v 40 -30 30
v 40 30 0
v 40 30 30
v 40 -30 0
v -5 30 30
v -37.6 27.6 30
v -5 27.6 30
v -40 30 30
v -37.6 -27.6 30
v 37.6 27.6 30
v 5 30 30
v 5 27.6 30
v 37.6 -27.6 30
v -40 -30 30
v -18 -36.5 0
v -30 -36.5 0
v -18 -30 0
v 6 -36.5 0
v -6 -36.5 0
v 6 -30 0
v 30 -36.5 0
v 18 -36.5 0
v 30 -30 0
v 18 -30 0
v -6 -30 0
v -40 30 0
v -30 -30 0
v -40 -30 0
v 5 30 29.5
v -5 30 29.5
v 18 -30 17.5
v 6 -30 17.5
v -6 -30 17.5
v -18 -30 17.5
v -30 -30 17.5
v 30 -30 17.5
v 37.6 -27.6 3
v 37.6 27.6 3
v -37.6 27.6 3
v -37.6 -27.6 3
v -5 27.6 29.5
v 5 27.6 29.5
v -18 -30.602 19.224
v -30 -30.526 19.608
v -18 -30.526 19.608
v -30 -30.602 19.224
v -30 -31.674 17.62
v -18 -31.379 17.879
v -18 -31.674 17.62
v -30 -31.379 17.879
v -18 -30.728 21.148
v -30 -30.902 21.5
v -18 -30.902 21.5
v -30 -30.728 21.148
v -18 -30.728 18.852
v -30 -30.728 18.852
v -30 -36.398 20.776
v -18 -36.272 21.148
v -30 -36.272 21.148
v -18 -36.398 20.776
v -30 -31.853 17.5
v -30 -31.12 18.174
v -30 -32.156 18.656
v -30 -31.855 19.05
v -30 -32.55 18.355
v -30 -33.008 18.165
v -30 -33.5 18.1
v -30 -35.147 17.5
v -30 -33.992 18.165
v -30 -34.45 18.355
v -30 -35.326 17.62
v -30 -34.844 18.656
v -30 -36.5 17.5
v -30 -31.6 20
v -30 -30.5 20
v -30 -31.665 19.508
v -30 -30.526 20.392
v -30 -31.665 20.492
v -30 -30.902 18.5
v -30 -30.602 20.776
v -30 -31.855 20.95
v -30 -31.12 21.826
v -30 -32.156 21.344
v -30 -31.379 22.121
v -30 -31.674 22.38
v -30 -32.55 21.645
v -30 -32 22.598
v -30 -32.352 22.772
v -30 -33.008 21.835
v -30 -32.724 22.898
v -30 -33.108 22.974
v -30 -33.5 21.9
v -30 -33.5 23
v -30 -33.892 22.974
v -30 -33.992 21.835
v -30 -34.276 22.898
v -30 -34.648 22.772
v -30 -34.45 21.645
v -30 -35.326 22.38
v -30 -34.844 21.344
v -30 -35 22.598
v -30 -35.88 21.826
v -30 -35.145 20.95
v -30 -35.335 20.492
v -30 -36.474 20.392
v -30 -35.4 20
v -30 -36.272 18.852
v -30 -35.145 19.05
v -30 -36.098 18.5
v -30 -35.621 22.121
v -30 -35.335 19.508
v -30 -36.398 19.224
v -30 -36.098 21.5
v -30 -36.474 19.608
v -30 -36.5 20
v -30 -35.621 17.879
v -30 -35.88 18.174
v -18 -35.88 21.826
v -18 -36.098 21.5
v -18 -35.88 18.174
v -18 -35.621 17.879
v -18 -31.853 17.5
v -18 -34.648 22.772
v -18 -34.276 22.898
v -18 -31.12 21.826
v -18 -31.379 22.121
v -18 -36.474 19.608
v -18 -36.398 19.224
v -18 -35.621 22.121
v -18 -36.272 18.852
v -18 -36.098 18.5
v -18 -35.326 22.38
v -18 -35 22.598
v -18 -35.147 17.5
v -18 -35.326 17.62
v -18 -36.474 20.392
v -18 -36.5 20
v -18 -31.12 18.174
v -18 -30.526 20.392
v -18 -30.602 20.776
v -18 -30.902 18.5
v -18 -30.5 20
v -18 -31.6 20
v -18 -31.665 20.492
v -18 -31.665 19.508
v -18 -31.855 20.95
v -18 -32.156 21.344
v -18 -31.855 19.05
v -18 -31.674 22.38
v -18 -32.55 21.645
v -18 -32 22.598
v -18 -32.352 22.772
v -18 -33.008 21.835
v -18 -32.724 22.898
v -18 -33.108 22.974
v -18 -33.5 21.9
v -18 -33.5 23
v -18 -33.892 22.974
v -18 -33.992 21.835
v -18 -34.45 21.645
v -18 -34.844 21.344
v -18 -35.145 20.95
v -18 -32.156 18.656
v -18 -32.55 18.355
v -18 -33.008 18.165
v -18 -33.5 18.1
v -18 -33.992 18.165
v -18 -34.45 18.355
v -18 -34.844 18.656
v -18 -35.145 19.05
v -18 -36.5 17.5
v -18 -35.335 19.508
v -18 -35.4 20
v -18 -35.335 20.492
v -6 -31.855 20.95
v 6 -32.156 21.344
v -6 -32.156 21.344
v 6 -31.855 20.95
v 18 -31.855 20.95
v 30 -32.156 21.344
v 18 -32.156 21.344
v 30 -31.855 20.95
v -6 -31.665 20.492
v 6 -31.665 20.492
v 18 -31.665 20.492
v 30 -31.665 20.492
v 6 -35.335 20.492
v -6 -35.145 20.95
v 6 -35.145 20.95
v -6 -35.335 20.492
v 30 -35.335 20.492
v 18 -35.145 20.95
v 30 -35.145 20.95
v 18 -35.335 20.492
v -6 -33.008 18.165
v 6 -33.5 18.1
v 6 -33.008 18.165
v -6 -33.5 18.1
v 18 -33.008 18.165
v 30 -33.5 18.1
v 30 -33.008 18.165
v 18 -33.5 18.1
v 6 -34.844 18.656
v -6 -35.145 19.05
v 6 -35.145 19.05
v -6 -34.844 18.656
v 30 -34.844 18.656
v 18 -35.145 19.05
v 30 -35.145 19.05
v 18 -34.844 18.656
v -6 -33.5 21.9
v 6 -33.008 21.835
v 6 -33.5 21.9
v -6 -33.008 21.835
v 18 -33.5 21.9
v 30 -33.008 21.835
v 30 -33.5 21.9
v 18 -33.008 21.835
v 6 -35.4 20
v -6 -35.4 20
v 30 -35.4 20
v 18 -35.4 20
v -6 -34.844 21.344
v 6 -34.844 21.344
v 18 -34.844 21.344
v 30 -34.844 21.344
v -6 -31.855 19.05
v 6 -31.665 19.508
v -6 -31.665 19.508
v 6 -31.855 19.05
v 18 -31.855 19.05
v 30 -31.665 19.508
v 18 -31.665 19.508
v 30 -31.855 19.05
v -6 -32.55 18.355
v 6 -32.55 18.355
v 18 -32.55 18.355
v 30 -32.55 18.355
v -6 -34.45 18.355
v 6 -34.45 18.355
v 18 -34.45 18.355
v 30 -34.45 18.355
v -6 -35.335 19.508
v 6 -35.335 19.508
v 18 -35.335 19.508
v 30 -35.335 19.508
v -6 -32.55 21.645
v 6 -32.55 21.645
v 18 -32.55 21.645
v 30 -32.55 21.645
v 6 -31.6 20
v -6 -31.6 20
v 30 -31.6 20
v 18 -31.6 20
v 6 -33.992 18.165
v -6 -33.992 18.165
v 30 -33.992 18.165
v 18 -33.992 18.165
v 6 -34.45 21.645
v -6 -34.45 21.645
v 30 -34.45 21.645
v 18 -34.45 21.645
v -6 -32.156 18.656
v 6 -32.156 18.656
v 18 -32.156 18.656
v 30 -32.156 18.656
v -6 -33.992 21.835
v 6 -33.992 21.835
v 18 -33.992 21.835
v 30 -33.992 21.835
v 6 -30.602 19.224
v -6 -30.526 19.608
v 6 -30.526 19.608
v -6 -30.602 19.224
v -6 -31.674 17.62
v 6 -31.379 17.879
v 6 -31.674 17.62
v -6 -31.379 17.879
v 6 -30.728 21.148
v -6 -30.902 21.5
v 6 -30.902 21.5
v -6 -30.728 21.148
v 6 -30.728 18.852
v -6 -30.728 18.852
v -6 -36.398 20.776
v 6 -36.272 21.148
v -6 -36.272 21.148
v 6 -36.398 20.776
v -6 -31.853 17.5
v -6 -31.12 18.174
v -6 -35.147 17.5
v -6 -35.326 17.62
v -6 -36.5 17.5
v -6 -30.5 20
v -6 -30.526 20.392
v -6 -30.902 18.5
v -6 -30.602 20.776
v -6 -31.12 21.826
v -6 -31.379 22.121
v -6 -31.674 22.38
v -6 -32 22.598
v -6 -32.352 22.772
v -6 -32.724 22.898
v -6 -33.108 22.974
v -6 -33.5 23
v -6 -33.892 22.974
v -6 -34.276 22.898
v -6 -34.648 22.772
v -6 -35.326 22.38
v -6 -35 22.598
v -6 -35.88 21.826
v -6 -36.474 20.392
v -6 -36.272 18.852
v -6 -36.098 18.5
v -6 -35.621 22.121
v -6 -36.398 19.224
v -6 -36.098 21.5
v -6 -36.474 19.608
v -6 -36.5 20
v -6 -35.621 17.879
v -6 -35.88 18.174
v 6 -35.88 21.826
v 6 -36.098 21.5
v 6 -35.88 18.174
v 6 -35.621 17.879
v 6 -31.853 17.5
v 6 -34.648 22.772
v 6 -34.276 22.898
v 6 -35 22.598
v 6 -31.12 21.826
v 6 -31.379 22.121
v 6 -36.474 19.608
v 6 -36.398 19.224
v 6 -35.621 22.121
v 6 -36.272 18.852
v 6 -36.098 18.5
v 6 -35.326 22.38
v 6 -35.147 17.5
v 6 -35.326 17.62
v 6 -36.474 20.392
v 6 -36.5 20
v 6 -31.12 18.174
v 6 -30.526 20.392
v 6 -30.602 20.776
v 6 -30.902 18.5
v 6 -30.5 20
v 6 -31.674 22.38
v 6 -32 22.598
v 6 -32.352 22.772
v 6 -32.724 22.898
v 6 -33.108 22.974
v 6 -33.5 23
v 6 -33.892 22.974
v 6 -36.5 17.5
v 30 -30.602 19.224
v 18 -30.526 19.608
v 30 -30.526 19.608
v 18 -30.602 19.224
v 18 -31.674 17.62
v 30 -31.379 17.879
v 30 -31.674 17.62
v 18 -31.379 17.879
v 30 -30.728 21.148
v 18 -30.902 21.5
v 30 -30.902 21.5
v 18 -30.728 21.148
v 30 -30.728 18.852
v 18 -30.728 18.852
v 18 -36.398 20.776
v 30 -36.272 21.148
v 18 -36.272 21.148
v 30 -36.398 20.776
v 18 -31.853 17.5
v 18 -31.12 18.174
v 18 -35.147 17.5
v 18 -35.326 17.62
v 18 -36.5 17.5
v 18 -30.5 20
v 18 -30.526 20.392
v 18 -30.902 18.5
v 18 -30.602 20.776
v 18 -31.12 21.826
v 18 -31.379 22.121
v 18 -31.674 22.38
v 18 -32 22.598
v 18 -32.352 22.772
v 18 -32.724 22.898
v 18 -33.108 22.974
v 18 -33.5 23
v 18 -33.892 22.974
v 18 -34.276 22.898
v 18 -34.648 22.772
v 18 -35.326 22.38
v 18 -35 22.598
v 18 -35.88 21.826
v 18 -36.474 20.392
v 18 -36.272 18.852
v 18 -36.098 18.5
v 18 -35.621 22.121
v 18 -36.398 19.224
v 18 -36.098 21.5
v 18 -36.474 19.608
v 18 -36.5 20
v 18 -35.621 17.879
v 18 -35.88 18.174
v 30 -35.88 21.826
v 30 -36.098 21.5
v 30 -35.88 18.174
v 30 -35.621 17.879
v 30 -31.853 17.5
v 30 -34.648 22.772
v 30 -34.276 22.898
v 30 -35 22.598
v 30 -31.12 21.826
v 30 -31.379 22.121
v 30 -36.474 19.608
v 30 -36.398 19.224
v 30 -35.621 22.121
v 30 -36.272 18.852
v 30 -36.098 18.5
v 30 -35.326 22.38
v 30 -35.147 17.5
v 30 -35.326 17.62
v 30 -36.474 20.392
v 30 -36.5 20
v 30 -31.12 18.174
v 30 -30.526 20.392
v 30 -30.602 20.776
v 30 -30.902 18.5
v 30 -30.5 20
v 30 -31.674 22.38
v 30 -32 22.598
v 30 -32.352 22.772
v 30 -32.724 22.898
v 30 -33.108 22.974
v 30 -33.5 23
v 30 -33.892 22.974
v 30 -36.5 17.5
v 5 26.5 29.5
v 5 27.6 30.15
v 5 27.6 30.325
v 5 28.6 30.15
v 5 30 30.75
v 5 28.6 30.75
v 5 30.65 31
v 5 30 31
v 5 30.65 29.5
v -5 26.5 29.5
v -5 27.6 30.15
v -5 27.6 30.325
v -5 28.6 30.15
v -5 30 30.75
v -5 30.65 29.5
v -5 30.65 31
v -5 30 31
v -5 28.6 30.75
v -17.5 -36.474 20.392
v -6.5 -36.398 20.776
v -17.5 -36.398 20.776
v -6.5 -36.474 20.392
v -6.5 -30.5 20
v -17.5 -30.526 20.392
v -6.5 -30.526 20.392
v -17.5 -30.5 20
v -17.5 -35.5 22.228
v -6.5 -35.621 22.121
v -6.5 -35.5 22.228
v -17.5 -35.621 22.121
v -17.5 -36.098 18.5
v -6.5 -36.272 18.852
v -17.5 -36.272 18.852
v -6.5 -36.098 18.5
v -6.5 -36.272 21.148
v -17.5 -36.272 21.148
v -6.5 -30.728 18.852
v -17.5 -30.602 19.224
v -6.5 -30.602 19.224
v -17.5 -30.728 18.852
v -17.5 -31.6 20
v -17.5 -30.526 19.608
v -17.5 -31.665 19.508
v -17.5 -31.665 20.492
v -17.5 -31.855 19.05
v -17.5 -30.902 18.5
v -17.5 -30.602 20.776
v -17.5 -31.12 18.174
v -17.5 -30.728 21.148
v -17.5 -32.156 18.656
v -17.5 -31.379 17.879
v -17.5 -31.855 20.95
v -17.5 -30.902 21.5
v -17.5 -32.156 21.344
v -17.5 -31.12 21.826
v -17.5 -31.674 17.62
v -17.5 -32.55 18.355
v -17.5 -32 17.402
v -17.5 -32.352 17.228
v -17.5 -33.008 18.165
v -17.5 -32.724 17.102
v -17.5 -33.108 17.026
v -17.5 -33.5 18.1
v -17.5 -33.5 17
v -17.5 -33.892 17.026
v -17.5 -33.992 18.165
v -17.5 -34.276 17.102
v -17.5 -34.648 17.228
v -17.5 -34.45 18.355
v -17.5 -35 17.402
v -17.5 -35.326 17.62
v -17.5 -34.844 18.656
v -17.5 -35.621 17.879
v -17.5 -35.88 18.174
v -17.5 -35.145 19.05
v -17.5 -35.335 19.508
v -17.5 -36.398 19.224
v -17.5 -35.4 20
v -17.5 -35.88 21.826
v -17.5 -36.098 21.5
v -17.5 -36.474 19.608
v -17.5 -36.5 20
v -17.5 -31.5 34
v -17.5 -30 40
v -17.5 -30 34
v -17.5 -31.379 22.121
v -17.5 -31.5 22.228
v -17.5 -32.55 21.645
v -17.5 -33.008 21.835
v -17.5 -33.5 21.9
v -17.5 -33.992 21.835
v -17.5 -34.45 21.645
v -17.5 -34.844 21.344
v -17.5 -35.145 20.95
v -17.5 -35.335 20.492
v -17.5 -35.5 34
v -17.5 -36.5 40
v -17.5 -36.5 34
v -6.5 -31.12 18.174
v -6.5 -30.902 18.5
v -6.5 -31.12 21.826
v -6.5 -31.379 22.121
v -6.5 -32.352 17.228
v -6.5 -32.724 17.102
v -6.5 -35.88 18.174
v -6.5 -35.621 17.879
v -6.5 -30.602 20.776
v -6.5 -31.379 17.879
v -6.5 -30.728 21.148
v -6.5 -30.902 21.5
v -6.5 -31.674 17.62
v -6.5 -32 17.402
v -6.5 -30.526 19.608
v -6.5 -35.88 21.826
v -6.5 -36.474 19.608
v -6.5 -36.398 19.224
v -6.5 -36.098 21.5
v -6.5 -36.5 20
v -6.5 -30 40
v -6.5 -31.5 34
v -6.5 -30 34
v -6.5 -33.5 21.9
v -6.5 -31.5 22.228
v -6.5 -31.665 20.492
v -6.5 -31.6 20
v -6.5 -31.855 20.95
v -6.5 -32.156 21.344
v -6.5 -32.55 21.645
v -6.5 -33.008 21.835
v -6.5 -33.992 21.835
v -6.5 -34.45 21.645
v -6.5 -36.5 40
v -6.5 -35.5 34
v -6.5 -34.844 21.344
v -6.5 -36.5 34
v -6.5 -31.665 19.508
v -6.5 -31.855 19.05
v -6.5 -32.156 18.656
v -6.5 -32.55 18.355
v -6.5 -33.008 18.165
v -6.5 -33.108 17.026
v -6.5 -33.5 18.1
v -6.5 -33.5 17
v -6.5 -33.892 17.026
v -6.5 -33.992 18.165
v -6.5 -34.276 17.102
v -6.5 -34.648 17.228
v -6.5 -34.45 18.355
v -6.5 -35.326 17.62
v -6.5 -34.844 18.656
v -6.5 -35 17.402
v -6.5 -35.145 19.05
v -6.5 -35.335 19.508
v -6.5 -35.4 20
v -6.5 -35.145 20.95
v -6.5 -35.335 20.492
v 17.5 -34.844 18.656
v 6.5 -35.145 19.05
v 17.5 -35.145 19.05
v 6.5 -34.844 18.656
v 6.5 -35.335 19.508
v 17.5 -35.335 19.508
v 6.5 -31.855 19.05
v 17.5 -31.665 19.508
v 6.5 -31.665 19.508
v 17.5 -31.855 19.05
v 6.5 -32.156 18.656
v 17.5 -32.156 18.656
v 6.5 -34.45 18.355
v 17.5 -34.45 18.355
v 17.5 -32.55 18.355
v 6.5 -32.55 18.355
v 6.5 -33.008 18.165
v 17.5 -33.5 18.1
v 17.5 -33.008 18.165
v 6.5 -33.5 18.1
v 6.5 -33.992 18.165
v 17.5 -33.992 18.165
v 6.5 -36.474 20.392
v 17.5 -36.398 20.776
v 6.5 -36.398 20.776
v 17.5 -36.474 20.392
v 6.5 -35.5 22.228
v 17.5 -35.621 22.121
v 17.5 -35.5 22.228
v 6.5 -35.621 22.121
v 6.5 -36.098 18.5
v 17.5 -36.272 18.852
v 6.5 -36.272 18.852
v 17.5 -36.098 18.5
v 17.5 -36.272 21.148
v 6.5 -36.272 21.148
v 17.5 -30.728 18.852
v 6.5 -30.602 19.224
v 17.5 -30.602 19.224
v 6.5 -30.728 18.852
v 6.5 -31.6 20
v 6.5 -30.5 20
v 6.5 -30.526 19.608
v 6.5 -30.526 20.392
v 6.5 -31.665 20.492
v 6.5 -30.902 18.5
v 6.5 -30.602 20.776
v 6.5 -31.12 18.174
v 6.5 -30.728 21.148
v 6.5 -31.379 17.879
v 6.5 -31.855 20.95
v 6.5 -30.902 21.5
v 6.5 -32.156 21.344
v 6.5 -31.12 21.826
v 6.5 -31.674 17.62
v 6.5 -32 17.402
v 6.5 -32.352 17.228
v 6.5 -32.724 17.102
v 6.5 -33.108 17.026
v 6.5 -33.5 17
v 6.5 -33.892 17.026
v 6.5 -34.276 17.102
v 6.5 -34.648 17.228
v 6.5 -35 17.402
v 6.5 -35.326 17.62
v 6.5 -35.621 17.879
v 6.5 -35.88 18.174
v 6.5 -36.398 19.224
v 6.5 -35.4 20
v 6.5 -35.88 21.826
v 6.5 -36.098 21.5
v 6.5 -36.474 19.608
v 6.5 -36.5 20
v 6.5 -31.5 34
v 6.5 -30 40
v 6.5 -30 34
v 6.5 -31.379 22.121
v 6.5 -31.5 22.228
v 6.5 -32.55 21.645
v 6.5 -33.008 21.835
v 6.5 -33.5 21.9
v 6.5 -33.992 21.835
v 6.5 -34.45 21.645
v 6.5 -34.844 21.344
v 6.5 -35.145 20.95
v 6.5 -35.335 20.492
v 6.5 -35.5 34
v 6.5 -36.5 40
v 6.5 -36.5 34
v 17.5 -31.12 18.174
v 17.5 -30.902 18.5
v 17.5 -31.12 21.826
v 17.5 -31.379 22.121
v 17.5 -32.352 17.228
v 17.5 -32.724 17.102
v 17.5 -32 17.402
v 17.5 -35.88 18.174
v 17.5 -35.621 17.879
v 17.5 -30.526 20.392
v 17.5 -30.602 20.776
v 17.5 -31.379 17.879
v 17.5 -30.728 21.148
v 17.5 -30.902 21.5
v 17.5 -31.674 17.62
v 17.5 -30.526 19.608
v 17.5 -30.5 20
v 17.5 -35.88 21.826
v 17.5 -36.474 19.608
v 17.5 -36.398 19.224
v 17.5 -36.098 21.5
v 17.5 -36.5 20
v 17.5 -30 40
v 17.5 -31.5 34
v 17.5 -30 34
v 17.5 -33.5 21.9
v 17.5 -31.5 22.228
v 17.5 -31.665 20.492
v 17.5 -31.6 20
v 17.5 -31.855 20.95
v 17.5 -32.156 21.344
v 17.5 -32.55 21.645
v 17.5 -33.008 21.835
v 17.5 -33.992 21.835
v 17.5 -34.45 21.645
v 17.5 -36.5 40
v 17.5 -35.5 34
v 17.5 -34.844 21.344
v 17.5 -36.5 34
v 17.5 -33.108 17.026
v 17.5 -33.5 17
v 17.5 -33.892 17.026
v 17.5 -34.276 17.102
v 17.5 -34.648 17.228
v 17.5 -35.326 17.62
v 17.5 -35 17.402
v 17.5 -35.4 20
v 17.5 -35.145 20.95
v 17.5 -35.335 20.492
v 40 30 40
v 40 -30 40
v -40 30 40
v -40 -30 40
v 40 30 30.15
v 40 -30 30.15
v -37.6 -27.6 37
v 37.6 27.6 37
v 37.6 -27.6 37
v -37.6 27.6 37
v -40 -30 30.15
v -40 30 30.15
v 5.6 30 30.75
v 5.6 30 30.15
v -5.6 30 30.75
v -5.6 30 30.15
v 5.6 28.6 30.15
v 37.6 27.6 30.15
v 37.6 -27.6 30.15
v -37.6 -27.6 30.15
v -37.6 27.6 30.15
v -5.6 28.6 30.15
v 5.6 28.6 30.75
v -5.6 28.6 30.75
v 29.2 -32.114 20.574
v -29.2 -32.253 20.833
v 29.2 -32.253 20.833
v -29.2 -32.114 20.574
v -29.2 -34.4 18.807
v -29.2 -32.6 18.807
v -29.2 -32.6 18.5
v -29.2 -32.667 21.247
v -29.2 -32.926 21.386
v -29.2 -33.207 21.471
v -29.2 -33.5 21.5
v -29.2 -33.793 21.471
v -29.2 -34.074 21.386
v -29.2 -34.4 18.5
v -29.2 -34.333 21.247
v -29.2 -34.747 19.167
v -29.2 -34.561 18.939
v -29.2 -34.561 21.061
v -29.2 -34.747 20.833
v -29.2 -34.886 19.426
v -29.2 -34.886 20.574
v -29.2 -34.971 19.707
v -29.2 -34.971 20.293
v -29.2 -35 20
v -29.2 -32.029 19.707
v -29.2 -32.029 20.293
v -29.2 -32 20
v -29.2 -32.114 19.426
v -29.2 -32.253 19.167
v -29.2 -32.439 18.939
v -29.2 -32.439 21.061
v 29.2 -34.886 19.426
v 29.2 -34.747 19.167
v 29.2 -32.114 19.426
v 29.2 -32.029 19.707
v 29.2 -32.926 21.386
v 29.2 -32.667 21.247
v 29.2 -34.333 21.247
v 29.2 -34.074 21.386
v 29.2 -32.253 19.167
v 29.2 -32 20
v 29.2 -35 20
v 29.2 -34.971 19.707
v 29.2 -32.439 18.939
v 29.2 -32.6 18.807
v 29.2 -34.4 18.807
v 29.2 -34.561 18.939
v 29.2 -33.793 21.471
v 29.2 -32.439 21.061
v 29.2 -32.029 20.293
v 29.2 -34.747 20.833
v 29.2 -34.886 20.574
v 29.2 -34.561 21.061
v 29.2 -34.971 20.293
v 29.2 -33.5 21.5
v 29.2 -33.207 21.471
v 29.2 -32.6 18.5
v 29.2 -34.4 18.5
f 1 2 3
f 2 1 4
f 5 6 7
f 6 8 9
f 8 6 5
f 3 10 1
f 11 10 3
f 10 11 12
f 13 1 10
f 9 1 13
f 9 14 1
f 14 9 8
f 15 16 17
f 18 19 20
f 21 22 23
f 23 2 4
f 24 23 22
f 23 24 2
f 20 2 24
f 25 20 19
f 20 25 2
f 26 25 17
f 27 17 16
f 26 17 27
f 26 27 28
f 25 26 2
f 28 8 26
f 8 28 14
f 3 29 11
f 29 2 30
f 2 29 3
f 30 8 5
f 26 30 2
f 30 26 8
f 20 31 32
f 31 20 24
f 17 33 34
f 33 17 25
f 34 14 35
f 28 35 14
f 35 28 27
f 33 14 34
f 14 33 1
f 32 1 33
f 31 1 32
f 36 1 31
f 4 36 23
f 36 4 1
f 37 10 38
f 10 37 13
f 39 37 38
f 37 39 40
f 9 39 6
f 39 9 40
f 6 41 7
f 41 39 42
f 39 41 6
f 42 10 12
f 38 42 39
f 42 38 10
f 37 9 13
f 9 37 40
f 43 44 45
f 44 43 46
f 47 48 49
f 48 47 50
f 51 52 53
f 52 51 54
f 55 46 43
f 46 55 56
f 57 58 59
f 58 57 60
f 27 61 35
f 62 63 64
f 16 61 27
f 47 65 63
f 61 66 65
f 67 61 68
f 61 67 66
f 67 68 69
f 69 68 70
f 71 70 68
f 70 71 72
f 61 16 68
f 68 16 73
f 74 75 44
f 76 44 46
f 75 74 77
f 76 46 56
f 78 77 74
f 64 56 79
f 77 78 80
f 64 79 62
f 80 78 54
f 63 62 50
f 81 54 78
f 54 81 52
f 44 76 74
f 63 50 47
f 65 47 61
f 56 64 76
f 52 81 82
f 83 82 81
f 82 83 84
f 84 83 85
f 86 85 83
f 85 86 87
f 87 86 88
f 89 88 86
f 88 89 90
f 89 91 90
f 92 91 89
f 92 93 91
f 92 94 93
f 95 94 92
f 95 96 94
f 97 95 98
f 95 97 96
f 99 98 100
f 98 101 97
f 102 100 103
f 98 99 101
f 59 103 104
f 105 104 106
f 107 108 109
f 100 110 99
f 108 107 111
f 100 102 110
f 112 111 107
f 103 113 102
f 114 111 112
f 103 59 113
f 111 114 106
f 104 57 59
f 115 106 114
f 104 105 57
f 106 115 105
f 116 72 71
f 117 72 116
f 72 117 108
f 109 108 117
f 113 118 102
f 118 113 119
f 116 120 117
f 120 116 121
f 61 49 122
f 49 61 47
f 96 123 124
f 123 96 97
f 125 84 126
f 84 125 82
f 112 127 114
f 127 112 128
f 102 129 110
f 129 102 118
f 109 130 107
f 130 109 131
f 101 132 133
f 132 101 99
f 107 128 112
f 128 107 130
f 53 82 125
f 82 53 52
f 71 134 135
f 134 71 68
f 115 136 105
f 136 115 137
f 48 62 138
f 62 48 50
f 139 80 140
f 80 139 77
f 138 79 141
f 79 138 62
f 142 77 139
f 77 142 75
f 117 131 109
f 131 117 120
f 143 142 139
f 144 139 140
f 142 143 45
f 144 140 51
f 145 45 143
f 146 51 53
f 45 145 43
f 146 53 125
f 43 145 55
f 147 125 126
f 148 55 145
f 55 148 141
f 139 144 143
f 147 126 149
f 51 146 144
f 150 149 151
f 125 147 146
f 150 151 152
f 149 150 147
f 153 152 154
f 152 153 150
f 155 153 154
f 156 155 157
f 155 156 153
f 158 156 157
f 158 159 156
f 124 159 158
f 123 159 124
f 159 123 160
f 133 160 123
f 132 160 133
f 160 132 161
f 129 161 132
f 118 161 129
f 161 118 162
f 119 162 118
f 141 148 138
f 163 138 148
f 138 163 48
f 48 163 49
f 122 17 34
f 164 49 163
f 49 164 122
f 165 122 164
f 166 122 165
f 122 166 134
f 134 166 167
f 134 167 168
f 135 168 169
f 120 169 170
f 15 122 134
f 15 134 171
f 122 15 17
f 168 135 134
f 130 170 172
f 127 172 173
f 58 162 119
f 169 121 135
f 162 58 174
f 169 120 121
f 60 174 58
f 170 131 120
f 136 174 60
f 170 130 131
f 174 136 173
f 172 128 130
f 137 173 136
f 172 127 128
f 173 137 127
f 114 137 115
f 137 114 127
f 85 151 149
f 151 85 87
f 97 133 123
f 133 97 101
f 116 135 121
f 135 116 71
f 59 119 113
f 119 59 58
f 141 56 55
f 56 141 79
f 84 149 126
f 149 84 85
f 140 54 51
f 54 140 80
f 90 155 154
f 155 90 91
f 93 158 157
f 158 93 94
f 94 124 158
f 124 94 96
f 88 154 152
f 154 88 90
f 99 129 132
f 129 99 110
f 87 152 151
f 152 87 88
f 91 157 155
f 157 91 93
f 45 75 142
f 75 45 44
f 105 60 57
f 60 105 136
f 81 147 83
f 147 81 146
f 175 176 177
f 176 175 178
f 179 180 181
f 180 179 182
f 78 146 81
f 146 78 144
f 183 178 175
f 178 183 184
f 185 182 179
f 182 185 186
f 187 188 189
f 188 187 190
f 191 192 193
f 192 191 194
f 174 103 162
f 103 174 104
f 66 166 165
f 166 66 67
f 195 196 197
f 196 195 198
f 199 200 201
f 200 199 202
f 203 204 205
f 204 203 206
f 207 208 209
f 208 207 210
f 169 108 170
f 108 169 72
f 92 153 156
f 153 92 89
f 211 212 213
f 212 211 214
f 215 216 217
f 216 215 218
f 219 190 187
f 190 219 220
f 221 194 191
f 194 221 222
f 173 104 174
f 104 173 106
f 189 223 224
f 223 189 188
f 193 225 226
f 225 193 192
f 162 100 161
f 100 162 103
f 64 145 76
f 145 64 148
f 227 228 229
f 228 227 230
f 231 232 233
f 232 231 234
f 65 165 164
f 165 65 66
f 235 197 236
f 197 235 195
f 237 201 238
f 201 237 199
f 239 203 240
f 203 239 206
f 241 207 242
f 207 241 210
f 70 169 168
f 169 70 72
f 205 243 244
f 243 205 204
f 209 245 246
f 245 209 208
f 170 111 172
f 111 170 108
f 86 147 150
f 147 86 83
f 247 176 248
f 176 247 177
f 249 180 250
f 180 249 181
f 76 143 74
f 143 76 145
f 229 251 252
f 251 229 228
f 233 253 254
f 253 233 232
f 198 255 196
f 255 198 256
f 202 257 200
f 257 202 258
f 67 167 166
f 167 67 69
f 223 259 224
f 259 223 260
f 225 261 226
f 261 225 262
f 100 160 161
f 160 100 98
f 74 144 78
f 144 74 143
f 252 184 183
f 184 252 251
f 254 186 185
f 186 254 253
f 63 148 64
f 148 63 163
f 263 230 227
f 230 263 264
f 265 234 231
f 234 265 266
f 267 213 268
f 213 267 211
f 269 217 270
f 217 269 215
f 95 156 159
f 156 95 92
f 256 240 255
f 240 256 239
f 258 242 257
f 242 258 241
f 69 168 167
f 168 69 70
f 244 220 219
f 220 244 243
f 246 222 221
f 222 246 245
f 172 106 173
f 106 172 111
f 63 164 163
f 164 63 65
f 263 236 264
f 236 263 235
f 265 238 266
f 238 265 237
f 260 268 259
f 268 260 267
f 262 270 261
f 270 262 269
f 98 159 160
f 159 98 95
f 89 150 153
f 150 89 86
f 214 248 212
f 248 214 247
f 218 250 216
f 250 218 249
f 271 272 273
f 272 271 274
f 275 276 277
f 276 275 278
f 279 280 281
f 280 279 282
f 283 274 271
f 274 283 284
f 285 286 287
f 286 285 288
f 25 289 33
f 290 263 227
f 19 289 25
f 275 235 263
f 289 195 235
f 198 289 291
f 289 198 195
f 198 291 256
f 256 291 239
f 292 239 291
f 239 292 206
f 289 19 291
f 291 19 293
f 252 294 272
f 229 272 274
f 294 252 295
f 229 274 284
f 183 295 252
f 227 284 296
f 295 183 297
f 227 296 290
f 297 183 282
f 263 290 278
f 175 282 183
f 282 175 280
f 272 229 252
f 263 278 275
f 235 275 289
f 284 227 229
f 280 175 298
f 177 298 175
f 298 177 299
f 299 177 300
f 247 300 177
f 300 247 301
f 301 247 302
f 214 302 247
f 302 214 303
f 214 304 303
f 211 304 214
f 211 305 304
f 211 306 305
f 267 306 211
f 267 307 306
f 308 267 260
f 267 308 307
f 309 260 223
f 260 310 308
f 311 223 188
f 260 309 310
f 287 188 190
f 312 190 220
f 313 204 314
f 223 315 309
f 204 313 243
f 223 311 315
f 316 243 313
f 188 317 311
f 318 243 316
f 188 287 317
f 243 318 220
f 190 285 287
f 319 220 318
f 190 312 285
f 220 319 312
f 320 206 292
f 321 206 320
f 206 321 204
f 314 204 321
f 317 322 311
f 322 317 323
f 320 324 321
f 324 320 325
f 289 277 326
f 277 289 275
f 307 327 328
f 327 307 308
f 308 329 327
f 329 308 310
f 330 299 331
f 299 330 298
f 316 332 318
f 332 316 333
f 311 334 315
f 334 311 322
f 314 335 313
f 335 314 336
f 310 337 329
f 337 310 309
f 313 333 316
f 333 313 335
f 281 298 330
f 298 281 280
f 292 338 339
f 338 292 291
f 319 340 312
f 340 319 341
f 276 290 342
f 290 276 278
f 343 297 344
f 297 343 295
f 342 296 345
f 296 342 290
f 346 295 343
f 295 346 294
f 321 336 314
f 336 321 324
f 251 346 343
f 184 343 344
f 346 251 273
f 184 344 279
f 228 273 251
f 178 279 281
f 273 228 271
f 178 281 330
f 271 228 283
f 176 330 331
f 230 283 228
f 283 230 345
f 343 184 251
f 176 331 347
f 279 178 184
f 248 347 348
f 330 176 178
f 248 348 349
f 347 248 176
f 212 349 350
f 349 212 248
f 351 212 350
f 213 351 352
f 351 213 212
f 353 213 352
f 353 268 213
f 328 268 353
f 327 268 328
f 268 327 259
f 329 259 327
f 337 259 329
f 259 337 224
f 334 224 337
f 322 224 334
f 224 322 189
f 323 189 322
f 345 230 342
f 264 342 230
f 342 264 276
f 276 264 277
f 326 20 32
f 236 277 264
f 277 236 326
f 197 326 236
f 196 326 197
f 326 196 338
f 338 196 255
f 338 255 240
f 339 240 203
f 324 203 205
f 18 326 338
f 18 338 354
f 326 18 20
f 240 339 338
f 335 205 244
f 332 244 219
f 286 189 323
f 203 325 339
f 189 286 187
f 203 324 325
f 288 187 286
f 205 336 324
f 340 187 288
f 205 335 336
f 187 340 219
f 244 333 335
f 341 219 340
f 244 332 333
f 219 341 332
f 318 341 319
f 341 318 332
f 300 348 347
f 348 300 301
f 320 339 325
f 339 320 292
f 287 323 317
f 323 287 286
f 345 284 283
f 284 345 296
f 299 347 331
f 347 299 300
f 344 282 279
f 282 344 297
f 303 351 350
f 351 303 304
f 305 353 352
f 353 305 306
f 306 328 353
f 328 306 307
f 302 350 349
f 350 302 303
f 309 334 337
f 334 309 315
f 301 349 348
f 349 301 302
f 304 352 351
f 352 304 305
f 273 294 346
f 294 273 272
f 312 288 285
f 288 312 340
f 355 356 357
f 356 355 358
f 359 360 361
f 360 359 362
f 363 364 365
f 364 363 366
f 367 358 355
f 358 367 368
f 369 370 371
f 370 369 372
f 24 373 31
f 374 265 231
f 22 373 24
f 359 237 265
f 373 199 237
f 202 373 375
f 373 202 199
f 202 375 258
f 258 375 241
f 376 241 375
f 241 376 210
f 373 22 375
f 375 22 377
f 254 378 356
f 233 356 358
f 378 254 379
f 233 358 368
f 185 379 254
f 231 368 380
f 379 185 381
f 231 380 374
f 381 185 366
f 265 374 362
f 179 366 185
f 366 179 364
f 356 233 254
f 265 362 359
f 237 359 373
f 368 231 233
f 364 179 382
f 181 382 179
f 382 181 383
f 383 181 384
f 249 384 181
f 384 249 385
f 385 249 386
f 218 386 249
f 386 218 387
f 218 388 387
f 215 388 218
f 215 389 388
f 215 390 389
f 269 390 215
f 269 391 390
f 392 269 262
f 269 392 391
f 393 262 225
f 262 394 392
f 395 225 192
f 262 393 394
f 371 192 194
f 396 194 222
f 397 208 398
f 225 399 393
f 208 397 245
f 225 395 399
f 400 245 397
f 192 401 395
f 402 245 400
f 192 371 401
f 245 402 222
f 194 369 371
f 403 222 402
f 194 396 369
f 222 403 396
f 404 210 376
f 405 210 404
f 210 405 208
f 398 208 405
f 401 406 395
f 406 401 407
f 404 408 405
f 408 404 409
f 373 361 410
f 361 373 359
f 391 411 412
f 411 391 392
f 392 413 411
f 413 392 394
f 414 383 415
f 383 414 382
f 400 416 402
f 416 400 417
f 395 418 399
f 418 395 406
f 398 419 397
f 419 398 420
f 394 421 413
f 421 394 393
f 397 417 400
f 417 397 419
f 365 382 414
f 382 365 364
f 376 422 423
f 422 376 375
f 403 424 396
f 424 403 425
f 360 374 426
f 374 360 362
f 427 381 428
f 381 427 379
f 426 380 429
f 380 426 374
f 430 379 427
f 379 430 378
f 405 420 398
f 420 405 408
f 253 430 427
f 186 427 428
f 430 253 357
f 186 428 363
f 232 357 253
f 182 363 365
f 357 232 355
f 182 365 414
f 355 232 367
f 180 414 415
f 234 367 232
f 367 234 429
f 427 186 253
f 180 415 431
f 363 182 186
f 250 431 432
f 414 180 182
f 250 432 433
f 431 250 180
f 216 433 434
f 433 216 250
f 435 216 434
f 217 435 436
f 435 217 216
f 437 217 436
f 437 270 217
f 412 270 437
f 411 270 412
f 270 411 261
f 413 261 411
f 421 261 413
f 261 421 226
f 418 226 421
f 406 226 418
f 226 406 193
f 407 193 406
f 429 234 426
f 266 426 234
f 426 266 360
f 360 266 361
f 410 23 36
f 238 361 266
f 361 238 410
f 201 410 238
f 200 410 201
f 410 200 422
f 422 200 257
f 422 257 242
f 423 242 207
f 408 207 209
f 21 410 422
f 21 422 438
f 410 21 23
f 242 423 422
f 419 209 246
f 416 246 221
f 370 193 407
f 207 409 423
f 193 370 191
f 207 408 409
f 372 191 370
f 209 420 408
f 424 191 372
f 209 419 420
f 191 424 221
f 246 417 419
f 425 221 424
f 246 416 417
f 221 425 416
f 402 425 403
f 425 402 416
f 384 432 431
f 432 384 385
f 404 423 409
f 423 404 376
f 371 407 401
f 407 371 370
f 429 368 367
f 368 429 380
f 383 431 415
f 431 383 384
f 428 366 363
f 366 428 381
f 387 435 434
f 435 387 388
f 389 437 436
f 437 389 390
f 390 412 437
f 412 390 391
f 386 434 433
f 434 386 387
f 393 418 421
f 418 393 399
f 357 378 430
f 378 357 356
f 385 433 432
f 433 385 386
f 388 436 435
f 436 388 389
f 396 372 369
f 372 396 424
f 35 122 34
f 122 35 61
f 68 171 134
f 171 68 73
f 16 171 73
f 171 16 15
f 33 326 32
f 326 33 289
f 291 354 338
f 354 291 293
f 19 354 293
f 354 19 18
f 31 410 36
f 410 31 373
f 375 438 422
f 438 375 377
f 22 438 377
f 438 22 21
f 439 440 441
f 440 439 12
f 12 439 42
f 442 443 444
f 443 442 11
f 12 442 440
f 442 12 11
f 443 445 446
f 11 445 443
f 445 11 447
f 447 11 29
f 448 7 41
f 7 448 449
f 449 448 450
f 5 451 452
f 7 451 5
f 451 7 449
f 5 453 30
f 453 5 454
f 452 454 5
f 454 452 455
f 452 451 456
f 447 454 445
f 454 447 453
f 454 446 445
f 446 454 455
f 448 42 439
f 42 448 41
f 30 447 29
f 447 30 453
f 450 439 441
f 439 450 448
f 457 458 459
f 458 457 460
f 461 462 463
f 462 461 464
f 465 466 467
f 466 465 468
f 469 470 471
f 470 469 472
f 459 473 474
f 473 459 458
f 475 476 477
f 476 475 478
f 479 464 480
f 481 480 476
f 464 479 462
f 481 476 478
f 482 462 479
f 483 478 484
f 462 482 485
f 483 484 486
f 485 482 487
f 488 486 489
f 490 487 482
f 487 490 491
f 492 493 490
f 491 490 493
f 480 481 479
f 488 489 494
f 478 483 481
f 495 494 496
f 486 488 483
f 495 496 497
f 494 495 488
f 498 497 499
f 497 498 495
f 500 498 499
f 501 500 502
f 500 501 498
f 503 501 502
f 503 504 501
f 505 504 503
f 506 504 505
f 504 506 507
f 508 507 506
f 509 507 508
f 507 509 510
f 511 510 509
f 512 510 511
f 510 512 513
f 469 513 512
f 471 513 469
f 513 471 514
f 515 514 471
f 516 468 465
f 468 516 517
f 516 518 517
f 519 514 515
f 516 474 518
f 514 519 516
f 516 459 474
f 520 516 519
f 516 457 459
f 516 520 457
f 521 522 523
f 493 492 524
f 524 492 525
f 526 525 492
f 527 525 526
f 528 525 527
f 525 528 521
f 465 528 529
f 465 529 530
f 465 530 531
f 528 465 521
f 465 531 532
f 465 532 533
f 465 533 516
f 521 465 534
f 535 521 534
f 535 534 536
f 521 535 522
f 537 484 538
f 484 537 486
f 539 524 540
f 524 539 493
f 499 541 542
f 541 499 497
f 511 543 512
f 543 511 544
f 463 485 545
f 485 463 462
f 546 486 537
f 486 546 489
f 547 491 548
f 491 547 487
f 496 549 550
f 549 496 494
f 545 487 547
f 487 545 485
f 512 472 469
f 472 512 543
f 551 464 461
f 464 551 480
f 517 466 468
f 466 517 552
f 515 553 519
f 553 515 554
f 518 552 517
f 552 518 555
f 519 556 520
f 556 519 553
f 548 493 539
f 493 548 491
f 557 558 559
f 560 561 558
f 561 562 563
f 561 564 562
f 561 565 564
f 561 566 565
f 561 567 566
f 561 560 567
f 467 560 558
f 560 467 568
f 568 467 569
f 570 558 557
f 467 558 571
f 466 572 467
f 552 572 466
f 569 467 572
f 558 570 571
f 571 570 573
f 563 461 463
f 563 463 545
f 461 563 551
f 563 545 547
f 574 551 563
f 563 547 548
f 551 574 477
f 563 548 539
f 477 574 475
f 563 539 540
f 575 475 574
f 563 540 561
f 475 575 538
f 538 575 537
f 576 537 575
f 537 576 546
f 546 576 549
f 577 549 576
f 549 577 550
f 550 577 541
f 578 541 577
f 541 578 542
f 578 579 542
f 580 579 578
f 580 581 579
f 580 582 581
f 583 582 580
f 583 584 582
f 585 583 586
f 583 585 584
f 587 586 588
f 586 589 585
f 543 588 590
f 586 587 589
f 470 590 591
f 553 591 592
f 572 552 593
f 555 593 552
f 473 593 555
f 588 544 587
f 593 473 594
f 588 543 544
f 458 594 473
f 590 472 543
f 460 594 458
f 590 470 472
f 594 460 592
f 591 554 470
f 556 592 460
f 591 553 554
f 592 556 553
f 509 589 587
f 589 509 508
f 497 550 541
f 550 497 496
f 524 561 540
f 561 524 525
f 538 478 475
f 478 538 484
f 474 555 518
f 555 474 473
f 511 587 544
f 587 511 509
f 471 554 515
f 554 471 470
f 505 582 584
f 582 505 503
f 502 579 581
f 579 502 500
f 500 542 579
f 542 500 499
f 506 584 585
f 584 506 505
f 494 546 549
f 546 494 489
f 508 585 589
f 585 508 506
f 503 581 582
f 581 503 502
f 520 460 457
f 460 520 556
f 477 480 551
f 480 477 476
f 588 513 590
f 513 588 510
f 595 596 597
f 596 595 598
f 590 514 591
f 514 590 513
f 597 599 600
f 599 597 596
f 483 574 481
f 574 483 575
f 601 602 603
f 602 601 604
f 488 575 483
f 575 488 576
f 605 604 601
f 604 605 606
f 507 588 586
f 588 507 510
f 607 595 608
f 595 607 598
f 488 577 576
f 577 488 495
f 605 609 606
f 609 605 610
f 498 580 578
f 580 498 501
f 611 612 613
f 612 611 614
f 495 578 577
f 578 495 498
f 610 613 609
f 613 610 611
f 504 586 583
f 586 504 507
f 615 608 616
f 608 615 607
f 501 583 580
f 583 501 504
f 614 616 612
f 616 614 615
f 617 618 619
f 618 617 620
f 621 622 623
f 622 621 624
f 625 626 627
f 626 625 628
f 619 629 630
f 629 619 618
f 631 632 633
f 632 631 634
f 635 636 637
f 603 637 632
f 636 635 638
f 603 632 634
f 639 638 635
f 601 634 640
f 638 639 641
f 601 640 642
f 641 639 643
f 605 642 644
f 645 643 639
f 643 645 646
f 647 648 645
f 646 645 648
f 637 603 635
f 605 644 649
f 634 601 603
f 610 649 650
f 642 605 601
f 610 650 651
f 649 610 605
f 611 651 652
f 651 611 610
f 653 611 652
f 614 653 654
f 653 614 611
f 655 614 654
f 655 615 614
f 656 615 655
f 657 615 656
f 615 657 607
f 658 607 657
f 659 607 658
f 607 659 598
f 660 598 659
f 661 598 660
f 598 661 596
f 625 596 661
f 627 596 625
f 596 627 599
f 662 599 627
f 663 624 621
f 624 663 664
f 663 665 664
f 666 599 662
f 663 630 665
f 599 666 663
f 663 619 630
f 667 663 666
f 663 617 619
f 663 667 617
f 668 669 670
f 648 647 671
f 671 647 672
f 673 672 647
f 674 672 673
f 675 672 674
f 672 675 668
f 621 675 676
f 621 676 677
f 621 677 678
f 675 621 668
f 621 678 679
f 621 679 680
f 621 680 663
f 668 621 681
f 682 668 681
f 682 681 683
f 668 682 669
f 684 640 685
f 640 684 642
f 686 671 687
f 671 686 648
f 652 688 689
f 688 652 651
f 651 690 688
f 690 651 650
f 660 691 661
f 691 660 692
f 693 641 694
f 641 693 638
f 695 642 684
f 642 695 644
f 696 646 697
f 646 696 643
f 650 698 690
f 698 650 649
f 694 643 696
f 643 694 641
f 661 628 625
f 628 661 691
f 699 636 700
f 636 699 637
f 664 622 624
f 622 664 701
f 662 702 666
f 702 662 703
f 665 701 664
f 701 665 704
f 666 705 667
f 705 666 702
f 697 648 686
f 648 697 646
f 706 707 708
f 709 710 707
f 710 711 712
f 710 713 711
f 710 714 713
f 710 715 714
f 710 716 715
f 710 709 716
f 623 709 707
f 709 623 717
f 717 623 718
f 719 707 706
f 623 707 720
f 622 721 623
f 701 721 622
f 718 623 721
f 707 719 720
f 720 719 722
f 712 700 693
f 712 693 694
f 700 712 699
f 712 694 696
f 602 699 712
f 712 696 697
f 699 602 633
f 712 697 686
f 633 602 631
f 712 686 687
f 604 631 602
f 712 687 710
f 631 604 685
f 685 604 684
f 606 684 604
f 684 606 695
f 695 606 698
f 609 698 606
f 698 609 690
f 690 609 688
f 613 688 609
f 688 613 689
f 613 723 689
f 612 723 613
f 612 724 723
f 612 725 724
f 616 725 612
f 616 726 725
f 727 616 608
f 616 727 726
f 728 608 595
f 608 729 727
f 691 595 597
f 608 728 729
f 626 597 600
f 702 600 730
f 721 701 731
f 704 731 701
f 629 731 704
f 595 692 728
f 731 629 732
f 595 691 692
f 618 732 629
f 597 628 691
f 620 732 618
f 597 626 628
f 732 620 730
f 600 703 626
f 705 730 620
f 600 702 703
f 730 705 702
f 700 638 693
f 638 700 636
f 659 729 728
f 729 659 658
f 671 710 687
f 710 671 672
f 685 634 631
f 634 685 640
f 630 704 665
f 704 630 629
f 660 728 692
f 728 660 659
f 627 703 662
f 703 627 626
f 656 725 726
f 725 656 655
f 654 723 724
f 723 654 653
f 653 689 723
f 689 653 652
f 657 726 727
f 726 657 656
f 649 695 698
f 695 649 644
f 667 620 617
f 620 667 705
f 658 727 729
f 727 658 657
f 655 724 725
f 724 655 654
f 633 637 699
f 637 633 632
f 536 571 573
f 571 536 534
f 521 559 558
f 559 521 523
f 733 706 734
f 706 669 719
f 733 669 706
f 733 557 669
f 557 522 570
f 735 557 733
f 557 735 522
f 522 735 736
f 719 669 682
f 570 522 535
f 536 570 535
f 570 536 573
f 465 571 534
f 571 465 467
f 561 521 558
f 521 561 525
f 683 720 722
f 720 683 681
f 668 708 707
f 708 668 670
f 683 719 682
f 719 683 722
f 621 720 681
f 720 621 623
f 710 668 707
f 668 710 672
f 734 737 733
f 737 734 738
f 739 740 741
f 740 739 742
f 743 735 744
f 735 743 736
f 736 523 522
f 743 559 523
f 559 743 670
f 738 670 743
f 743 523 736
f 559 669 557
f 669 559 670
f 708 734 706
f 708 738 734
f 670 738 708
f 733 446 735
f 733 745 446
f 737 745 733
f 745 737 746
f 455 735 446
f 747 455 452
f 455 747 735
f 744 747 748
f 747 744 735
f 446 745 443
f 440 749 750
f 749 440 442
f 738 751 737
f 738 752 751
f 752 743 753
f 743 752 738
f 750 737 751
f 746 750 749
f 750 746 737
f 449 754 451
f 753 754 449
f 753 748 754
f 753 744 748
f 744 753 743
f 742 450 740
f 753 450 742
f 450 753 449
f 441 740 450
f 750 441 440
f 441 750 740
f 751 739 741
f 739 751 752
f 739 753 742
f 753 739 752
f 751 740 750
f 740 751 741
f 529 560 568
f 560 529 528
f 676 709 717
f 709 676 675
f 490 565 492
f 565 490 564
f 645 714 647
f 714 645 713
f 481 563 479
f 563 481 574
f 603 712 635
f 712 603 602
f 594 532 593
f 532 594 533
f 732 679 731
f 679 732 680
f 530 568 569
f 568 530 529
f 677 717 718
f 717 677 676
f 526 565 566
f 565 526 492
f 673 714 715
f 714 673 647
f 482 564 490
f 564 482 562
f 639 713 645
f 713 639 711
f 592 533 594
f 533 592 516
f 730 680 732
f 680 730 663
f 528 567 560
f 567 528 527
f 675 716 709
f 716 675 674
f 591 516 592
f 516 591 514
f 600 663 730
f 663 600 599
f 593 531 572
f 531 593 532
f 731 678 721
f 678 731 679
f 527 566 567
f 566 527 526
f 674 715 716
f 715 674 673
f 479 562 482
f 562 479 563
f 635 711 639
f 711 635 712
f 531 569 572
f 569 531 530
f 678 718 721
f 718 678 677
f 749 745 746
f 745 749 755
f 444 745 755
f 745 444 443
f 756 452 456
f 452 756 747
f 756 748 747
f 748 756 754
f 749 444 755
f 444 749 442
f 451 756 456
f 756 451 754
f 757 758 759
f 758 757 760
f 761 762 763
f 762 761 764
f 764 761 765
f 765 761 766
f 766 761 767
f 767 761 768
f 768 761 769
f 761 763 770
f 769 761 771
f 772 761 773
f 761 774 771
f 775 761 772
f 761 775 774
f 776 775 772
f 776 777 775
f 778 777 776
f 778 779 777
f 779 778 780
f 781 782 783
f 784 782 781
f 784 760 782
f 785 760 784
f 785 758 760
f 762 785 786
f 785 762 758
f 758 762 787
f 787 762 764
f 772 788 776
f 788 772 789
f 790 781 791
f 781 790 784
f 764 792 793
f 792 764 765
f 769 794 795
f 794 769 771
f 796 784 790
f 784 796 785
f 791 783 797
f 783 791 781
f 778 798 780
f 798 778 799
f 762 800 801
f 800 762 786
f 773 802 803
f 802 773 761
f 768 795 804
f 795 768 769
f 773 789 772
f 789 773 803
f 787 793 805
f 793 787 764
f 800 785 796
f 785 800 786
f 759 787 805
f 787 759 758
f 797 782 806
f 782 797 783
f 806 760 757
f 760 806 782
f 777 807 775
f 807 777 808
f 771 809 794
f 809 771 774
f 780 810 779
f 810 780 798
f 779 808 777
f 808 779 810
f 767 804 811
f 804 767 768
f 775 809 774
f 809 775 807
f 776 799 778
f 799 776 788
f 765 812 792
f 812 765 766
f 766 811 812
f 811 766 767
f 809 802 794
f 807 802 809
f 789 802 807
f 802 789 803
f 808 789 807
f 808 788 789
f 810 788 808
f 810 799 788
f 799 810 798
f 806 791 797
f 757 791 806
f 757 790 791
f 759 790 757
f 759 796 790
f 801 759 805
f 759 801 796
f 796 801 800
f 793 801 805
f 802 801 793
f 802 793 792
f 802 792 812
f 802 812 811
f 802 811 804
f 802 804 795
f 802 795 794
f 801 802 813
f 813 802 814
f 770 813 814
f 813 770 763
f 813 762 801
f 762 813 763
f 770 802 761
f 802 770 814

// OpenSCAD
part = "assembly"; // [base, lid, pin, assembly]
cadverify_only = "";
module instance(name, part, unit = 1) {
  echo(cadverify_instance = [name, part, unit]);
  if (cadverify_only == "" || cadverify_only == name) children();
}
Ya = -33.5; Za = 20; Kr = 3.0; Br = 1.9; Pr = 1.5;
BX = [[-30,-18],[-6,6],[18,30]];
LX = [[-17.5,-6.5],[6.5,17.5]];
module barrelX(x0, x1) {
  difference() {
    translate([0,Ya,Za]) rotate([0,90,0]) translate([0,0,(x0+x1)/2])
      cylinder(h=x1-x0, r=Kr, center=true, $fn=48);
    translate([0,Ya,Za]) rotate([0,90,0]) translate([0,0,(x0+x1)/2])
      cylinder(h=(x1-x0)+1.0, r=Br, center=true, $fn=24);
  }
}
module base_geom() {
  difference() {
  union() {
    difference() {
      translate([-40,-30,0]) cube([80,60,30]);
      translate([-37.6,-27.6,3]) cube([75.2,55.2,27.01]);
    }
    for (b=BX) {
      translate([b[0],-36.5,0]) cube([b[1]-b[0],6.5,17.5]);
      barrelX(b[0], b[1]);
    }
    translate([5,0,0]) rotate([0,-90,0]) linear_extrude(height=10)
      polygon([[29.5,26.5],[31,28.5],[31,30.65],[29.5,30.65]]);
  }
  translate([0,Ya,Za]) rotate([0,90,0]) translate([0,0,0])
    cylinder(h=62, r=Br, center=true, $fn=24);
  }
}
module lid_open() {
  difference() {
    union() {
      translate([-40,-97,0]) cube([80,60,3]);
      translate([-40,-97,3]) cube([80,2.4,6.85]);
      translate([-40,-39.4,3]) cube([80,2.4,6.85]);
      translate([-40,-97,3]) cube([2.4,60,6.85]);
      translate([37.6,-97,3]) cube([2.4,60,6.85]);
      for (b=LX) {
        translate([b[0],-39,0]) cube([b[1]-b[0],8.5,6]);
        translate([b[0],-35.5,3]) cube([b[1]-b[0],4,17.5]);
        barrelX(b[0], b[1]);
      }
    }
    translate([0,Ya,Za]) rotate([0,90,0]) translate([0,0,0])
      cylinder(h=62, r=Br, center=true, $fn=24);
    translate([-5.6,-98.6,9.25]) cube([11.2,3,0.76]);
  }
}
module pin_geom() {
  union() {
    translate([-29.2,0,1.5]) rotate([0,90,0])
      cylinder(h=58.4, r=Pr, center=false, $fn=32);
    translate([-29.2,-0.9,0]) cube([58.4,1.8,0.6]);
  }
}
module lid_closed() {
  translate([0,Ya,Za]) rotate([180,0,0]) translate([0,-Ya,-Za]) lid_open();
}
module pin_placed() {
  translate([0,Ya,Za-1.5]) pin_geom();
}
if (part=="base") {
  base_geom();
  echo(cadverify_spec=[
    ["bounds", [[-40,-36.5,0],[40,30.65,31]]],
    ["bodies", 1],
    ["support_faces", [["base","-z",4000]]],
    ["overhangs_allowed", [["hinge", [[-30,-37,16],[30,-30,24]]]]],
    ["copies", 1],
    ["details", [
      ["bottom","thickness",[0,0,-1],[0,0,1],3],
      ["cavity","void",[[-37.6,-27.6,3],[37.6,27.6,30]],0.9],
      ["knuckle","material",[[-30,-36.5,17],[-18,-30.5,23]],0.5],
      ["bore","hole",[-31,-33.5,20],[1,0,0],[[0,3.8],[10,3.8]]],
      ["catch","material",[[-5,30,26.5],[5,31,30.65]],0.15]
    ]]
  ]);
} else if (part=="lid") {
  lid_open();
  echo(cadverify_spec=[
    ["bounds", [[-40,-97,0],[40,-30.5,23]]],
    ["bodies", 1],
    ["support_faces", [["lid","-z",4000]]],
    ["overhangs_allowed", [["hinge", [[-30,-37,16],[30,-30,24]]]]],
    ["copies", 1],
    ["details", [
      ["plate","thickness",[0,-67,-1],[0,0,1],3],
      ["pocket","void",[[-37.6,-94.6,3],[37.6,-39.4,9.85]],0.9],
      ["knuckle","material",[[-17.5,-36.5,17],[-6.5,-30.5,23]],0.4],
      ["bore","hole",[-18,-33.5,20],[1,0,0],[[0,3.8],[9,3.8]]],
      ["notch","void",[[-5.6,-97,9.25],[5.6,-95.6,9.85]],0.9]
    ]]
  ]);
} else if (part=="pin") {
  pin_geom();
  echo(cadverify_spec=[
    ["bounds", [[-29.2,-1.5,0],[29.2,1.5,3]]],
    ["bodies", 1],
    ["support_faces", [["pin","-z",50]]],
    ["overhangs_allowed", [["flanks", [[-29.2,-1.5,0],[29.2,1.5,3]]]]],
    ["copies", 1],
    ["details", [
      ["shaft","thickness",[0,5,1.5],[0,-1,0],3]
    ]]
  ]);
} else {
  instance("base","base") base_geom();
  instance("lid","lid") lid_closed();
  instance("pin","pin") pin_placed();
  echo(cadverify_spec=[
    ["bounds", [[-40,-36.5,0],[40,30.65,40]]],
    ["support_faces", [["bed","-z",4000]]],
    ["motions", [["swing",["lid"],"rotate",[0,-33.5,20],[1,0,0],[0,180],["flex",[["lid","base",0.5,"catch entry"]]]]]],
    ["assembly_order", [[["base"],[0,0,0]],[["lid"],[0,0,1]],[["pin"],[-1,0,0]]]],
    ["print_in_place", 0.4],
    ["print_pose", [["swing",180]]],
    ["overhangs_allowed", [["hinge", [[-30,-37,16],[30,-30,24]]]]]
  ]);
}
